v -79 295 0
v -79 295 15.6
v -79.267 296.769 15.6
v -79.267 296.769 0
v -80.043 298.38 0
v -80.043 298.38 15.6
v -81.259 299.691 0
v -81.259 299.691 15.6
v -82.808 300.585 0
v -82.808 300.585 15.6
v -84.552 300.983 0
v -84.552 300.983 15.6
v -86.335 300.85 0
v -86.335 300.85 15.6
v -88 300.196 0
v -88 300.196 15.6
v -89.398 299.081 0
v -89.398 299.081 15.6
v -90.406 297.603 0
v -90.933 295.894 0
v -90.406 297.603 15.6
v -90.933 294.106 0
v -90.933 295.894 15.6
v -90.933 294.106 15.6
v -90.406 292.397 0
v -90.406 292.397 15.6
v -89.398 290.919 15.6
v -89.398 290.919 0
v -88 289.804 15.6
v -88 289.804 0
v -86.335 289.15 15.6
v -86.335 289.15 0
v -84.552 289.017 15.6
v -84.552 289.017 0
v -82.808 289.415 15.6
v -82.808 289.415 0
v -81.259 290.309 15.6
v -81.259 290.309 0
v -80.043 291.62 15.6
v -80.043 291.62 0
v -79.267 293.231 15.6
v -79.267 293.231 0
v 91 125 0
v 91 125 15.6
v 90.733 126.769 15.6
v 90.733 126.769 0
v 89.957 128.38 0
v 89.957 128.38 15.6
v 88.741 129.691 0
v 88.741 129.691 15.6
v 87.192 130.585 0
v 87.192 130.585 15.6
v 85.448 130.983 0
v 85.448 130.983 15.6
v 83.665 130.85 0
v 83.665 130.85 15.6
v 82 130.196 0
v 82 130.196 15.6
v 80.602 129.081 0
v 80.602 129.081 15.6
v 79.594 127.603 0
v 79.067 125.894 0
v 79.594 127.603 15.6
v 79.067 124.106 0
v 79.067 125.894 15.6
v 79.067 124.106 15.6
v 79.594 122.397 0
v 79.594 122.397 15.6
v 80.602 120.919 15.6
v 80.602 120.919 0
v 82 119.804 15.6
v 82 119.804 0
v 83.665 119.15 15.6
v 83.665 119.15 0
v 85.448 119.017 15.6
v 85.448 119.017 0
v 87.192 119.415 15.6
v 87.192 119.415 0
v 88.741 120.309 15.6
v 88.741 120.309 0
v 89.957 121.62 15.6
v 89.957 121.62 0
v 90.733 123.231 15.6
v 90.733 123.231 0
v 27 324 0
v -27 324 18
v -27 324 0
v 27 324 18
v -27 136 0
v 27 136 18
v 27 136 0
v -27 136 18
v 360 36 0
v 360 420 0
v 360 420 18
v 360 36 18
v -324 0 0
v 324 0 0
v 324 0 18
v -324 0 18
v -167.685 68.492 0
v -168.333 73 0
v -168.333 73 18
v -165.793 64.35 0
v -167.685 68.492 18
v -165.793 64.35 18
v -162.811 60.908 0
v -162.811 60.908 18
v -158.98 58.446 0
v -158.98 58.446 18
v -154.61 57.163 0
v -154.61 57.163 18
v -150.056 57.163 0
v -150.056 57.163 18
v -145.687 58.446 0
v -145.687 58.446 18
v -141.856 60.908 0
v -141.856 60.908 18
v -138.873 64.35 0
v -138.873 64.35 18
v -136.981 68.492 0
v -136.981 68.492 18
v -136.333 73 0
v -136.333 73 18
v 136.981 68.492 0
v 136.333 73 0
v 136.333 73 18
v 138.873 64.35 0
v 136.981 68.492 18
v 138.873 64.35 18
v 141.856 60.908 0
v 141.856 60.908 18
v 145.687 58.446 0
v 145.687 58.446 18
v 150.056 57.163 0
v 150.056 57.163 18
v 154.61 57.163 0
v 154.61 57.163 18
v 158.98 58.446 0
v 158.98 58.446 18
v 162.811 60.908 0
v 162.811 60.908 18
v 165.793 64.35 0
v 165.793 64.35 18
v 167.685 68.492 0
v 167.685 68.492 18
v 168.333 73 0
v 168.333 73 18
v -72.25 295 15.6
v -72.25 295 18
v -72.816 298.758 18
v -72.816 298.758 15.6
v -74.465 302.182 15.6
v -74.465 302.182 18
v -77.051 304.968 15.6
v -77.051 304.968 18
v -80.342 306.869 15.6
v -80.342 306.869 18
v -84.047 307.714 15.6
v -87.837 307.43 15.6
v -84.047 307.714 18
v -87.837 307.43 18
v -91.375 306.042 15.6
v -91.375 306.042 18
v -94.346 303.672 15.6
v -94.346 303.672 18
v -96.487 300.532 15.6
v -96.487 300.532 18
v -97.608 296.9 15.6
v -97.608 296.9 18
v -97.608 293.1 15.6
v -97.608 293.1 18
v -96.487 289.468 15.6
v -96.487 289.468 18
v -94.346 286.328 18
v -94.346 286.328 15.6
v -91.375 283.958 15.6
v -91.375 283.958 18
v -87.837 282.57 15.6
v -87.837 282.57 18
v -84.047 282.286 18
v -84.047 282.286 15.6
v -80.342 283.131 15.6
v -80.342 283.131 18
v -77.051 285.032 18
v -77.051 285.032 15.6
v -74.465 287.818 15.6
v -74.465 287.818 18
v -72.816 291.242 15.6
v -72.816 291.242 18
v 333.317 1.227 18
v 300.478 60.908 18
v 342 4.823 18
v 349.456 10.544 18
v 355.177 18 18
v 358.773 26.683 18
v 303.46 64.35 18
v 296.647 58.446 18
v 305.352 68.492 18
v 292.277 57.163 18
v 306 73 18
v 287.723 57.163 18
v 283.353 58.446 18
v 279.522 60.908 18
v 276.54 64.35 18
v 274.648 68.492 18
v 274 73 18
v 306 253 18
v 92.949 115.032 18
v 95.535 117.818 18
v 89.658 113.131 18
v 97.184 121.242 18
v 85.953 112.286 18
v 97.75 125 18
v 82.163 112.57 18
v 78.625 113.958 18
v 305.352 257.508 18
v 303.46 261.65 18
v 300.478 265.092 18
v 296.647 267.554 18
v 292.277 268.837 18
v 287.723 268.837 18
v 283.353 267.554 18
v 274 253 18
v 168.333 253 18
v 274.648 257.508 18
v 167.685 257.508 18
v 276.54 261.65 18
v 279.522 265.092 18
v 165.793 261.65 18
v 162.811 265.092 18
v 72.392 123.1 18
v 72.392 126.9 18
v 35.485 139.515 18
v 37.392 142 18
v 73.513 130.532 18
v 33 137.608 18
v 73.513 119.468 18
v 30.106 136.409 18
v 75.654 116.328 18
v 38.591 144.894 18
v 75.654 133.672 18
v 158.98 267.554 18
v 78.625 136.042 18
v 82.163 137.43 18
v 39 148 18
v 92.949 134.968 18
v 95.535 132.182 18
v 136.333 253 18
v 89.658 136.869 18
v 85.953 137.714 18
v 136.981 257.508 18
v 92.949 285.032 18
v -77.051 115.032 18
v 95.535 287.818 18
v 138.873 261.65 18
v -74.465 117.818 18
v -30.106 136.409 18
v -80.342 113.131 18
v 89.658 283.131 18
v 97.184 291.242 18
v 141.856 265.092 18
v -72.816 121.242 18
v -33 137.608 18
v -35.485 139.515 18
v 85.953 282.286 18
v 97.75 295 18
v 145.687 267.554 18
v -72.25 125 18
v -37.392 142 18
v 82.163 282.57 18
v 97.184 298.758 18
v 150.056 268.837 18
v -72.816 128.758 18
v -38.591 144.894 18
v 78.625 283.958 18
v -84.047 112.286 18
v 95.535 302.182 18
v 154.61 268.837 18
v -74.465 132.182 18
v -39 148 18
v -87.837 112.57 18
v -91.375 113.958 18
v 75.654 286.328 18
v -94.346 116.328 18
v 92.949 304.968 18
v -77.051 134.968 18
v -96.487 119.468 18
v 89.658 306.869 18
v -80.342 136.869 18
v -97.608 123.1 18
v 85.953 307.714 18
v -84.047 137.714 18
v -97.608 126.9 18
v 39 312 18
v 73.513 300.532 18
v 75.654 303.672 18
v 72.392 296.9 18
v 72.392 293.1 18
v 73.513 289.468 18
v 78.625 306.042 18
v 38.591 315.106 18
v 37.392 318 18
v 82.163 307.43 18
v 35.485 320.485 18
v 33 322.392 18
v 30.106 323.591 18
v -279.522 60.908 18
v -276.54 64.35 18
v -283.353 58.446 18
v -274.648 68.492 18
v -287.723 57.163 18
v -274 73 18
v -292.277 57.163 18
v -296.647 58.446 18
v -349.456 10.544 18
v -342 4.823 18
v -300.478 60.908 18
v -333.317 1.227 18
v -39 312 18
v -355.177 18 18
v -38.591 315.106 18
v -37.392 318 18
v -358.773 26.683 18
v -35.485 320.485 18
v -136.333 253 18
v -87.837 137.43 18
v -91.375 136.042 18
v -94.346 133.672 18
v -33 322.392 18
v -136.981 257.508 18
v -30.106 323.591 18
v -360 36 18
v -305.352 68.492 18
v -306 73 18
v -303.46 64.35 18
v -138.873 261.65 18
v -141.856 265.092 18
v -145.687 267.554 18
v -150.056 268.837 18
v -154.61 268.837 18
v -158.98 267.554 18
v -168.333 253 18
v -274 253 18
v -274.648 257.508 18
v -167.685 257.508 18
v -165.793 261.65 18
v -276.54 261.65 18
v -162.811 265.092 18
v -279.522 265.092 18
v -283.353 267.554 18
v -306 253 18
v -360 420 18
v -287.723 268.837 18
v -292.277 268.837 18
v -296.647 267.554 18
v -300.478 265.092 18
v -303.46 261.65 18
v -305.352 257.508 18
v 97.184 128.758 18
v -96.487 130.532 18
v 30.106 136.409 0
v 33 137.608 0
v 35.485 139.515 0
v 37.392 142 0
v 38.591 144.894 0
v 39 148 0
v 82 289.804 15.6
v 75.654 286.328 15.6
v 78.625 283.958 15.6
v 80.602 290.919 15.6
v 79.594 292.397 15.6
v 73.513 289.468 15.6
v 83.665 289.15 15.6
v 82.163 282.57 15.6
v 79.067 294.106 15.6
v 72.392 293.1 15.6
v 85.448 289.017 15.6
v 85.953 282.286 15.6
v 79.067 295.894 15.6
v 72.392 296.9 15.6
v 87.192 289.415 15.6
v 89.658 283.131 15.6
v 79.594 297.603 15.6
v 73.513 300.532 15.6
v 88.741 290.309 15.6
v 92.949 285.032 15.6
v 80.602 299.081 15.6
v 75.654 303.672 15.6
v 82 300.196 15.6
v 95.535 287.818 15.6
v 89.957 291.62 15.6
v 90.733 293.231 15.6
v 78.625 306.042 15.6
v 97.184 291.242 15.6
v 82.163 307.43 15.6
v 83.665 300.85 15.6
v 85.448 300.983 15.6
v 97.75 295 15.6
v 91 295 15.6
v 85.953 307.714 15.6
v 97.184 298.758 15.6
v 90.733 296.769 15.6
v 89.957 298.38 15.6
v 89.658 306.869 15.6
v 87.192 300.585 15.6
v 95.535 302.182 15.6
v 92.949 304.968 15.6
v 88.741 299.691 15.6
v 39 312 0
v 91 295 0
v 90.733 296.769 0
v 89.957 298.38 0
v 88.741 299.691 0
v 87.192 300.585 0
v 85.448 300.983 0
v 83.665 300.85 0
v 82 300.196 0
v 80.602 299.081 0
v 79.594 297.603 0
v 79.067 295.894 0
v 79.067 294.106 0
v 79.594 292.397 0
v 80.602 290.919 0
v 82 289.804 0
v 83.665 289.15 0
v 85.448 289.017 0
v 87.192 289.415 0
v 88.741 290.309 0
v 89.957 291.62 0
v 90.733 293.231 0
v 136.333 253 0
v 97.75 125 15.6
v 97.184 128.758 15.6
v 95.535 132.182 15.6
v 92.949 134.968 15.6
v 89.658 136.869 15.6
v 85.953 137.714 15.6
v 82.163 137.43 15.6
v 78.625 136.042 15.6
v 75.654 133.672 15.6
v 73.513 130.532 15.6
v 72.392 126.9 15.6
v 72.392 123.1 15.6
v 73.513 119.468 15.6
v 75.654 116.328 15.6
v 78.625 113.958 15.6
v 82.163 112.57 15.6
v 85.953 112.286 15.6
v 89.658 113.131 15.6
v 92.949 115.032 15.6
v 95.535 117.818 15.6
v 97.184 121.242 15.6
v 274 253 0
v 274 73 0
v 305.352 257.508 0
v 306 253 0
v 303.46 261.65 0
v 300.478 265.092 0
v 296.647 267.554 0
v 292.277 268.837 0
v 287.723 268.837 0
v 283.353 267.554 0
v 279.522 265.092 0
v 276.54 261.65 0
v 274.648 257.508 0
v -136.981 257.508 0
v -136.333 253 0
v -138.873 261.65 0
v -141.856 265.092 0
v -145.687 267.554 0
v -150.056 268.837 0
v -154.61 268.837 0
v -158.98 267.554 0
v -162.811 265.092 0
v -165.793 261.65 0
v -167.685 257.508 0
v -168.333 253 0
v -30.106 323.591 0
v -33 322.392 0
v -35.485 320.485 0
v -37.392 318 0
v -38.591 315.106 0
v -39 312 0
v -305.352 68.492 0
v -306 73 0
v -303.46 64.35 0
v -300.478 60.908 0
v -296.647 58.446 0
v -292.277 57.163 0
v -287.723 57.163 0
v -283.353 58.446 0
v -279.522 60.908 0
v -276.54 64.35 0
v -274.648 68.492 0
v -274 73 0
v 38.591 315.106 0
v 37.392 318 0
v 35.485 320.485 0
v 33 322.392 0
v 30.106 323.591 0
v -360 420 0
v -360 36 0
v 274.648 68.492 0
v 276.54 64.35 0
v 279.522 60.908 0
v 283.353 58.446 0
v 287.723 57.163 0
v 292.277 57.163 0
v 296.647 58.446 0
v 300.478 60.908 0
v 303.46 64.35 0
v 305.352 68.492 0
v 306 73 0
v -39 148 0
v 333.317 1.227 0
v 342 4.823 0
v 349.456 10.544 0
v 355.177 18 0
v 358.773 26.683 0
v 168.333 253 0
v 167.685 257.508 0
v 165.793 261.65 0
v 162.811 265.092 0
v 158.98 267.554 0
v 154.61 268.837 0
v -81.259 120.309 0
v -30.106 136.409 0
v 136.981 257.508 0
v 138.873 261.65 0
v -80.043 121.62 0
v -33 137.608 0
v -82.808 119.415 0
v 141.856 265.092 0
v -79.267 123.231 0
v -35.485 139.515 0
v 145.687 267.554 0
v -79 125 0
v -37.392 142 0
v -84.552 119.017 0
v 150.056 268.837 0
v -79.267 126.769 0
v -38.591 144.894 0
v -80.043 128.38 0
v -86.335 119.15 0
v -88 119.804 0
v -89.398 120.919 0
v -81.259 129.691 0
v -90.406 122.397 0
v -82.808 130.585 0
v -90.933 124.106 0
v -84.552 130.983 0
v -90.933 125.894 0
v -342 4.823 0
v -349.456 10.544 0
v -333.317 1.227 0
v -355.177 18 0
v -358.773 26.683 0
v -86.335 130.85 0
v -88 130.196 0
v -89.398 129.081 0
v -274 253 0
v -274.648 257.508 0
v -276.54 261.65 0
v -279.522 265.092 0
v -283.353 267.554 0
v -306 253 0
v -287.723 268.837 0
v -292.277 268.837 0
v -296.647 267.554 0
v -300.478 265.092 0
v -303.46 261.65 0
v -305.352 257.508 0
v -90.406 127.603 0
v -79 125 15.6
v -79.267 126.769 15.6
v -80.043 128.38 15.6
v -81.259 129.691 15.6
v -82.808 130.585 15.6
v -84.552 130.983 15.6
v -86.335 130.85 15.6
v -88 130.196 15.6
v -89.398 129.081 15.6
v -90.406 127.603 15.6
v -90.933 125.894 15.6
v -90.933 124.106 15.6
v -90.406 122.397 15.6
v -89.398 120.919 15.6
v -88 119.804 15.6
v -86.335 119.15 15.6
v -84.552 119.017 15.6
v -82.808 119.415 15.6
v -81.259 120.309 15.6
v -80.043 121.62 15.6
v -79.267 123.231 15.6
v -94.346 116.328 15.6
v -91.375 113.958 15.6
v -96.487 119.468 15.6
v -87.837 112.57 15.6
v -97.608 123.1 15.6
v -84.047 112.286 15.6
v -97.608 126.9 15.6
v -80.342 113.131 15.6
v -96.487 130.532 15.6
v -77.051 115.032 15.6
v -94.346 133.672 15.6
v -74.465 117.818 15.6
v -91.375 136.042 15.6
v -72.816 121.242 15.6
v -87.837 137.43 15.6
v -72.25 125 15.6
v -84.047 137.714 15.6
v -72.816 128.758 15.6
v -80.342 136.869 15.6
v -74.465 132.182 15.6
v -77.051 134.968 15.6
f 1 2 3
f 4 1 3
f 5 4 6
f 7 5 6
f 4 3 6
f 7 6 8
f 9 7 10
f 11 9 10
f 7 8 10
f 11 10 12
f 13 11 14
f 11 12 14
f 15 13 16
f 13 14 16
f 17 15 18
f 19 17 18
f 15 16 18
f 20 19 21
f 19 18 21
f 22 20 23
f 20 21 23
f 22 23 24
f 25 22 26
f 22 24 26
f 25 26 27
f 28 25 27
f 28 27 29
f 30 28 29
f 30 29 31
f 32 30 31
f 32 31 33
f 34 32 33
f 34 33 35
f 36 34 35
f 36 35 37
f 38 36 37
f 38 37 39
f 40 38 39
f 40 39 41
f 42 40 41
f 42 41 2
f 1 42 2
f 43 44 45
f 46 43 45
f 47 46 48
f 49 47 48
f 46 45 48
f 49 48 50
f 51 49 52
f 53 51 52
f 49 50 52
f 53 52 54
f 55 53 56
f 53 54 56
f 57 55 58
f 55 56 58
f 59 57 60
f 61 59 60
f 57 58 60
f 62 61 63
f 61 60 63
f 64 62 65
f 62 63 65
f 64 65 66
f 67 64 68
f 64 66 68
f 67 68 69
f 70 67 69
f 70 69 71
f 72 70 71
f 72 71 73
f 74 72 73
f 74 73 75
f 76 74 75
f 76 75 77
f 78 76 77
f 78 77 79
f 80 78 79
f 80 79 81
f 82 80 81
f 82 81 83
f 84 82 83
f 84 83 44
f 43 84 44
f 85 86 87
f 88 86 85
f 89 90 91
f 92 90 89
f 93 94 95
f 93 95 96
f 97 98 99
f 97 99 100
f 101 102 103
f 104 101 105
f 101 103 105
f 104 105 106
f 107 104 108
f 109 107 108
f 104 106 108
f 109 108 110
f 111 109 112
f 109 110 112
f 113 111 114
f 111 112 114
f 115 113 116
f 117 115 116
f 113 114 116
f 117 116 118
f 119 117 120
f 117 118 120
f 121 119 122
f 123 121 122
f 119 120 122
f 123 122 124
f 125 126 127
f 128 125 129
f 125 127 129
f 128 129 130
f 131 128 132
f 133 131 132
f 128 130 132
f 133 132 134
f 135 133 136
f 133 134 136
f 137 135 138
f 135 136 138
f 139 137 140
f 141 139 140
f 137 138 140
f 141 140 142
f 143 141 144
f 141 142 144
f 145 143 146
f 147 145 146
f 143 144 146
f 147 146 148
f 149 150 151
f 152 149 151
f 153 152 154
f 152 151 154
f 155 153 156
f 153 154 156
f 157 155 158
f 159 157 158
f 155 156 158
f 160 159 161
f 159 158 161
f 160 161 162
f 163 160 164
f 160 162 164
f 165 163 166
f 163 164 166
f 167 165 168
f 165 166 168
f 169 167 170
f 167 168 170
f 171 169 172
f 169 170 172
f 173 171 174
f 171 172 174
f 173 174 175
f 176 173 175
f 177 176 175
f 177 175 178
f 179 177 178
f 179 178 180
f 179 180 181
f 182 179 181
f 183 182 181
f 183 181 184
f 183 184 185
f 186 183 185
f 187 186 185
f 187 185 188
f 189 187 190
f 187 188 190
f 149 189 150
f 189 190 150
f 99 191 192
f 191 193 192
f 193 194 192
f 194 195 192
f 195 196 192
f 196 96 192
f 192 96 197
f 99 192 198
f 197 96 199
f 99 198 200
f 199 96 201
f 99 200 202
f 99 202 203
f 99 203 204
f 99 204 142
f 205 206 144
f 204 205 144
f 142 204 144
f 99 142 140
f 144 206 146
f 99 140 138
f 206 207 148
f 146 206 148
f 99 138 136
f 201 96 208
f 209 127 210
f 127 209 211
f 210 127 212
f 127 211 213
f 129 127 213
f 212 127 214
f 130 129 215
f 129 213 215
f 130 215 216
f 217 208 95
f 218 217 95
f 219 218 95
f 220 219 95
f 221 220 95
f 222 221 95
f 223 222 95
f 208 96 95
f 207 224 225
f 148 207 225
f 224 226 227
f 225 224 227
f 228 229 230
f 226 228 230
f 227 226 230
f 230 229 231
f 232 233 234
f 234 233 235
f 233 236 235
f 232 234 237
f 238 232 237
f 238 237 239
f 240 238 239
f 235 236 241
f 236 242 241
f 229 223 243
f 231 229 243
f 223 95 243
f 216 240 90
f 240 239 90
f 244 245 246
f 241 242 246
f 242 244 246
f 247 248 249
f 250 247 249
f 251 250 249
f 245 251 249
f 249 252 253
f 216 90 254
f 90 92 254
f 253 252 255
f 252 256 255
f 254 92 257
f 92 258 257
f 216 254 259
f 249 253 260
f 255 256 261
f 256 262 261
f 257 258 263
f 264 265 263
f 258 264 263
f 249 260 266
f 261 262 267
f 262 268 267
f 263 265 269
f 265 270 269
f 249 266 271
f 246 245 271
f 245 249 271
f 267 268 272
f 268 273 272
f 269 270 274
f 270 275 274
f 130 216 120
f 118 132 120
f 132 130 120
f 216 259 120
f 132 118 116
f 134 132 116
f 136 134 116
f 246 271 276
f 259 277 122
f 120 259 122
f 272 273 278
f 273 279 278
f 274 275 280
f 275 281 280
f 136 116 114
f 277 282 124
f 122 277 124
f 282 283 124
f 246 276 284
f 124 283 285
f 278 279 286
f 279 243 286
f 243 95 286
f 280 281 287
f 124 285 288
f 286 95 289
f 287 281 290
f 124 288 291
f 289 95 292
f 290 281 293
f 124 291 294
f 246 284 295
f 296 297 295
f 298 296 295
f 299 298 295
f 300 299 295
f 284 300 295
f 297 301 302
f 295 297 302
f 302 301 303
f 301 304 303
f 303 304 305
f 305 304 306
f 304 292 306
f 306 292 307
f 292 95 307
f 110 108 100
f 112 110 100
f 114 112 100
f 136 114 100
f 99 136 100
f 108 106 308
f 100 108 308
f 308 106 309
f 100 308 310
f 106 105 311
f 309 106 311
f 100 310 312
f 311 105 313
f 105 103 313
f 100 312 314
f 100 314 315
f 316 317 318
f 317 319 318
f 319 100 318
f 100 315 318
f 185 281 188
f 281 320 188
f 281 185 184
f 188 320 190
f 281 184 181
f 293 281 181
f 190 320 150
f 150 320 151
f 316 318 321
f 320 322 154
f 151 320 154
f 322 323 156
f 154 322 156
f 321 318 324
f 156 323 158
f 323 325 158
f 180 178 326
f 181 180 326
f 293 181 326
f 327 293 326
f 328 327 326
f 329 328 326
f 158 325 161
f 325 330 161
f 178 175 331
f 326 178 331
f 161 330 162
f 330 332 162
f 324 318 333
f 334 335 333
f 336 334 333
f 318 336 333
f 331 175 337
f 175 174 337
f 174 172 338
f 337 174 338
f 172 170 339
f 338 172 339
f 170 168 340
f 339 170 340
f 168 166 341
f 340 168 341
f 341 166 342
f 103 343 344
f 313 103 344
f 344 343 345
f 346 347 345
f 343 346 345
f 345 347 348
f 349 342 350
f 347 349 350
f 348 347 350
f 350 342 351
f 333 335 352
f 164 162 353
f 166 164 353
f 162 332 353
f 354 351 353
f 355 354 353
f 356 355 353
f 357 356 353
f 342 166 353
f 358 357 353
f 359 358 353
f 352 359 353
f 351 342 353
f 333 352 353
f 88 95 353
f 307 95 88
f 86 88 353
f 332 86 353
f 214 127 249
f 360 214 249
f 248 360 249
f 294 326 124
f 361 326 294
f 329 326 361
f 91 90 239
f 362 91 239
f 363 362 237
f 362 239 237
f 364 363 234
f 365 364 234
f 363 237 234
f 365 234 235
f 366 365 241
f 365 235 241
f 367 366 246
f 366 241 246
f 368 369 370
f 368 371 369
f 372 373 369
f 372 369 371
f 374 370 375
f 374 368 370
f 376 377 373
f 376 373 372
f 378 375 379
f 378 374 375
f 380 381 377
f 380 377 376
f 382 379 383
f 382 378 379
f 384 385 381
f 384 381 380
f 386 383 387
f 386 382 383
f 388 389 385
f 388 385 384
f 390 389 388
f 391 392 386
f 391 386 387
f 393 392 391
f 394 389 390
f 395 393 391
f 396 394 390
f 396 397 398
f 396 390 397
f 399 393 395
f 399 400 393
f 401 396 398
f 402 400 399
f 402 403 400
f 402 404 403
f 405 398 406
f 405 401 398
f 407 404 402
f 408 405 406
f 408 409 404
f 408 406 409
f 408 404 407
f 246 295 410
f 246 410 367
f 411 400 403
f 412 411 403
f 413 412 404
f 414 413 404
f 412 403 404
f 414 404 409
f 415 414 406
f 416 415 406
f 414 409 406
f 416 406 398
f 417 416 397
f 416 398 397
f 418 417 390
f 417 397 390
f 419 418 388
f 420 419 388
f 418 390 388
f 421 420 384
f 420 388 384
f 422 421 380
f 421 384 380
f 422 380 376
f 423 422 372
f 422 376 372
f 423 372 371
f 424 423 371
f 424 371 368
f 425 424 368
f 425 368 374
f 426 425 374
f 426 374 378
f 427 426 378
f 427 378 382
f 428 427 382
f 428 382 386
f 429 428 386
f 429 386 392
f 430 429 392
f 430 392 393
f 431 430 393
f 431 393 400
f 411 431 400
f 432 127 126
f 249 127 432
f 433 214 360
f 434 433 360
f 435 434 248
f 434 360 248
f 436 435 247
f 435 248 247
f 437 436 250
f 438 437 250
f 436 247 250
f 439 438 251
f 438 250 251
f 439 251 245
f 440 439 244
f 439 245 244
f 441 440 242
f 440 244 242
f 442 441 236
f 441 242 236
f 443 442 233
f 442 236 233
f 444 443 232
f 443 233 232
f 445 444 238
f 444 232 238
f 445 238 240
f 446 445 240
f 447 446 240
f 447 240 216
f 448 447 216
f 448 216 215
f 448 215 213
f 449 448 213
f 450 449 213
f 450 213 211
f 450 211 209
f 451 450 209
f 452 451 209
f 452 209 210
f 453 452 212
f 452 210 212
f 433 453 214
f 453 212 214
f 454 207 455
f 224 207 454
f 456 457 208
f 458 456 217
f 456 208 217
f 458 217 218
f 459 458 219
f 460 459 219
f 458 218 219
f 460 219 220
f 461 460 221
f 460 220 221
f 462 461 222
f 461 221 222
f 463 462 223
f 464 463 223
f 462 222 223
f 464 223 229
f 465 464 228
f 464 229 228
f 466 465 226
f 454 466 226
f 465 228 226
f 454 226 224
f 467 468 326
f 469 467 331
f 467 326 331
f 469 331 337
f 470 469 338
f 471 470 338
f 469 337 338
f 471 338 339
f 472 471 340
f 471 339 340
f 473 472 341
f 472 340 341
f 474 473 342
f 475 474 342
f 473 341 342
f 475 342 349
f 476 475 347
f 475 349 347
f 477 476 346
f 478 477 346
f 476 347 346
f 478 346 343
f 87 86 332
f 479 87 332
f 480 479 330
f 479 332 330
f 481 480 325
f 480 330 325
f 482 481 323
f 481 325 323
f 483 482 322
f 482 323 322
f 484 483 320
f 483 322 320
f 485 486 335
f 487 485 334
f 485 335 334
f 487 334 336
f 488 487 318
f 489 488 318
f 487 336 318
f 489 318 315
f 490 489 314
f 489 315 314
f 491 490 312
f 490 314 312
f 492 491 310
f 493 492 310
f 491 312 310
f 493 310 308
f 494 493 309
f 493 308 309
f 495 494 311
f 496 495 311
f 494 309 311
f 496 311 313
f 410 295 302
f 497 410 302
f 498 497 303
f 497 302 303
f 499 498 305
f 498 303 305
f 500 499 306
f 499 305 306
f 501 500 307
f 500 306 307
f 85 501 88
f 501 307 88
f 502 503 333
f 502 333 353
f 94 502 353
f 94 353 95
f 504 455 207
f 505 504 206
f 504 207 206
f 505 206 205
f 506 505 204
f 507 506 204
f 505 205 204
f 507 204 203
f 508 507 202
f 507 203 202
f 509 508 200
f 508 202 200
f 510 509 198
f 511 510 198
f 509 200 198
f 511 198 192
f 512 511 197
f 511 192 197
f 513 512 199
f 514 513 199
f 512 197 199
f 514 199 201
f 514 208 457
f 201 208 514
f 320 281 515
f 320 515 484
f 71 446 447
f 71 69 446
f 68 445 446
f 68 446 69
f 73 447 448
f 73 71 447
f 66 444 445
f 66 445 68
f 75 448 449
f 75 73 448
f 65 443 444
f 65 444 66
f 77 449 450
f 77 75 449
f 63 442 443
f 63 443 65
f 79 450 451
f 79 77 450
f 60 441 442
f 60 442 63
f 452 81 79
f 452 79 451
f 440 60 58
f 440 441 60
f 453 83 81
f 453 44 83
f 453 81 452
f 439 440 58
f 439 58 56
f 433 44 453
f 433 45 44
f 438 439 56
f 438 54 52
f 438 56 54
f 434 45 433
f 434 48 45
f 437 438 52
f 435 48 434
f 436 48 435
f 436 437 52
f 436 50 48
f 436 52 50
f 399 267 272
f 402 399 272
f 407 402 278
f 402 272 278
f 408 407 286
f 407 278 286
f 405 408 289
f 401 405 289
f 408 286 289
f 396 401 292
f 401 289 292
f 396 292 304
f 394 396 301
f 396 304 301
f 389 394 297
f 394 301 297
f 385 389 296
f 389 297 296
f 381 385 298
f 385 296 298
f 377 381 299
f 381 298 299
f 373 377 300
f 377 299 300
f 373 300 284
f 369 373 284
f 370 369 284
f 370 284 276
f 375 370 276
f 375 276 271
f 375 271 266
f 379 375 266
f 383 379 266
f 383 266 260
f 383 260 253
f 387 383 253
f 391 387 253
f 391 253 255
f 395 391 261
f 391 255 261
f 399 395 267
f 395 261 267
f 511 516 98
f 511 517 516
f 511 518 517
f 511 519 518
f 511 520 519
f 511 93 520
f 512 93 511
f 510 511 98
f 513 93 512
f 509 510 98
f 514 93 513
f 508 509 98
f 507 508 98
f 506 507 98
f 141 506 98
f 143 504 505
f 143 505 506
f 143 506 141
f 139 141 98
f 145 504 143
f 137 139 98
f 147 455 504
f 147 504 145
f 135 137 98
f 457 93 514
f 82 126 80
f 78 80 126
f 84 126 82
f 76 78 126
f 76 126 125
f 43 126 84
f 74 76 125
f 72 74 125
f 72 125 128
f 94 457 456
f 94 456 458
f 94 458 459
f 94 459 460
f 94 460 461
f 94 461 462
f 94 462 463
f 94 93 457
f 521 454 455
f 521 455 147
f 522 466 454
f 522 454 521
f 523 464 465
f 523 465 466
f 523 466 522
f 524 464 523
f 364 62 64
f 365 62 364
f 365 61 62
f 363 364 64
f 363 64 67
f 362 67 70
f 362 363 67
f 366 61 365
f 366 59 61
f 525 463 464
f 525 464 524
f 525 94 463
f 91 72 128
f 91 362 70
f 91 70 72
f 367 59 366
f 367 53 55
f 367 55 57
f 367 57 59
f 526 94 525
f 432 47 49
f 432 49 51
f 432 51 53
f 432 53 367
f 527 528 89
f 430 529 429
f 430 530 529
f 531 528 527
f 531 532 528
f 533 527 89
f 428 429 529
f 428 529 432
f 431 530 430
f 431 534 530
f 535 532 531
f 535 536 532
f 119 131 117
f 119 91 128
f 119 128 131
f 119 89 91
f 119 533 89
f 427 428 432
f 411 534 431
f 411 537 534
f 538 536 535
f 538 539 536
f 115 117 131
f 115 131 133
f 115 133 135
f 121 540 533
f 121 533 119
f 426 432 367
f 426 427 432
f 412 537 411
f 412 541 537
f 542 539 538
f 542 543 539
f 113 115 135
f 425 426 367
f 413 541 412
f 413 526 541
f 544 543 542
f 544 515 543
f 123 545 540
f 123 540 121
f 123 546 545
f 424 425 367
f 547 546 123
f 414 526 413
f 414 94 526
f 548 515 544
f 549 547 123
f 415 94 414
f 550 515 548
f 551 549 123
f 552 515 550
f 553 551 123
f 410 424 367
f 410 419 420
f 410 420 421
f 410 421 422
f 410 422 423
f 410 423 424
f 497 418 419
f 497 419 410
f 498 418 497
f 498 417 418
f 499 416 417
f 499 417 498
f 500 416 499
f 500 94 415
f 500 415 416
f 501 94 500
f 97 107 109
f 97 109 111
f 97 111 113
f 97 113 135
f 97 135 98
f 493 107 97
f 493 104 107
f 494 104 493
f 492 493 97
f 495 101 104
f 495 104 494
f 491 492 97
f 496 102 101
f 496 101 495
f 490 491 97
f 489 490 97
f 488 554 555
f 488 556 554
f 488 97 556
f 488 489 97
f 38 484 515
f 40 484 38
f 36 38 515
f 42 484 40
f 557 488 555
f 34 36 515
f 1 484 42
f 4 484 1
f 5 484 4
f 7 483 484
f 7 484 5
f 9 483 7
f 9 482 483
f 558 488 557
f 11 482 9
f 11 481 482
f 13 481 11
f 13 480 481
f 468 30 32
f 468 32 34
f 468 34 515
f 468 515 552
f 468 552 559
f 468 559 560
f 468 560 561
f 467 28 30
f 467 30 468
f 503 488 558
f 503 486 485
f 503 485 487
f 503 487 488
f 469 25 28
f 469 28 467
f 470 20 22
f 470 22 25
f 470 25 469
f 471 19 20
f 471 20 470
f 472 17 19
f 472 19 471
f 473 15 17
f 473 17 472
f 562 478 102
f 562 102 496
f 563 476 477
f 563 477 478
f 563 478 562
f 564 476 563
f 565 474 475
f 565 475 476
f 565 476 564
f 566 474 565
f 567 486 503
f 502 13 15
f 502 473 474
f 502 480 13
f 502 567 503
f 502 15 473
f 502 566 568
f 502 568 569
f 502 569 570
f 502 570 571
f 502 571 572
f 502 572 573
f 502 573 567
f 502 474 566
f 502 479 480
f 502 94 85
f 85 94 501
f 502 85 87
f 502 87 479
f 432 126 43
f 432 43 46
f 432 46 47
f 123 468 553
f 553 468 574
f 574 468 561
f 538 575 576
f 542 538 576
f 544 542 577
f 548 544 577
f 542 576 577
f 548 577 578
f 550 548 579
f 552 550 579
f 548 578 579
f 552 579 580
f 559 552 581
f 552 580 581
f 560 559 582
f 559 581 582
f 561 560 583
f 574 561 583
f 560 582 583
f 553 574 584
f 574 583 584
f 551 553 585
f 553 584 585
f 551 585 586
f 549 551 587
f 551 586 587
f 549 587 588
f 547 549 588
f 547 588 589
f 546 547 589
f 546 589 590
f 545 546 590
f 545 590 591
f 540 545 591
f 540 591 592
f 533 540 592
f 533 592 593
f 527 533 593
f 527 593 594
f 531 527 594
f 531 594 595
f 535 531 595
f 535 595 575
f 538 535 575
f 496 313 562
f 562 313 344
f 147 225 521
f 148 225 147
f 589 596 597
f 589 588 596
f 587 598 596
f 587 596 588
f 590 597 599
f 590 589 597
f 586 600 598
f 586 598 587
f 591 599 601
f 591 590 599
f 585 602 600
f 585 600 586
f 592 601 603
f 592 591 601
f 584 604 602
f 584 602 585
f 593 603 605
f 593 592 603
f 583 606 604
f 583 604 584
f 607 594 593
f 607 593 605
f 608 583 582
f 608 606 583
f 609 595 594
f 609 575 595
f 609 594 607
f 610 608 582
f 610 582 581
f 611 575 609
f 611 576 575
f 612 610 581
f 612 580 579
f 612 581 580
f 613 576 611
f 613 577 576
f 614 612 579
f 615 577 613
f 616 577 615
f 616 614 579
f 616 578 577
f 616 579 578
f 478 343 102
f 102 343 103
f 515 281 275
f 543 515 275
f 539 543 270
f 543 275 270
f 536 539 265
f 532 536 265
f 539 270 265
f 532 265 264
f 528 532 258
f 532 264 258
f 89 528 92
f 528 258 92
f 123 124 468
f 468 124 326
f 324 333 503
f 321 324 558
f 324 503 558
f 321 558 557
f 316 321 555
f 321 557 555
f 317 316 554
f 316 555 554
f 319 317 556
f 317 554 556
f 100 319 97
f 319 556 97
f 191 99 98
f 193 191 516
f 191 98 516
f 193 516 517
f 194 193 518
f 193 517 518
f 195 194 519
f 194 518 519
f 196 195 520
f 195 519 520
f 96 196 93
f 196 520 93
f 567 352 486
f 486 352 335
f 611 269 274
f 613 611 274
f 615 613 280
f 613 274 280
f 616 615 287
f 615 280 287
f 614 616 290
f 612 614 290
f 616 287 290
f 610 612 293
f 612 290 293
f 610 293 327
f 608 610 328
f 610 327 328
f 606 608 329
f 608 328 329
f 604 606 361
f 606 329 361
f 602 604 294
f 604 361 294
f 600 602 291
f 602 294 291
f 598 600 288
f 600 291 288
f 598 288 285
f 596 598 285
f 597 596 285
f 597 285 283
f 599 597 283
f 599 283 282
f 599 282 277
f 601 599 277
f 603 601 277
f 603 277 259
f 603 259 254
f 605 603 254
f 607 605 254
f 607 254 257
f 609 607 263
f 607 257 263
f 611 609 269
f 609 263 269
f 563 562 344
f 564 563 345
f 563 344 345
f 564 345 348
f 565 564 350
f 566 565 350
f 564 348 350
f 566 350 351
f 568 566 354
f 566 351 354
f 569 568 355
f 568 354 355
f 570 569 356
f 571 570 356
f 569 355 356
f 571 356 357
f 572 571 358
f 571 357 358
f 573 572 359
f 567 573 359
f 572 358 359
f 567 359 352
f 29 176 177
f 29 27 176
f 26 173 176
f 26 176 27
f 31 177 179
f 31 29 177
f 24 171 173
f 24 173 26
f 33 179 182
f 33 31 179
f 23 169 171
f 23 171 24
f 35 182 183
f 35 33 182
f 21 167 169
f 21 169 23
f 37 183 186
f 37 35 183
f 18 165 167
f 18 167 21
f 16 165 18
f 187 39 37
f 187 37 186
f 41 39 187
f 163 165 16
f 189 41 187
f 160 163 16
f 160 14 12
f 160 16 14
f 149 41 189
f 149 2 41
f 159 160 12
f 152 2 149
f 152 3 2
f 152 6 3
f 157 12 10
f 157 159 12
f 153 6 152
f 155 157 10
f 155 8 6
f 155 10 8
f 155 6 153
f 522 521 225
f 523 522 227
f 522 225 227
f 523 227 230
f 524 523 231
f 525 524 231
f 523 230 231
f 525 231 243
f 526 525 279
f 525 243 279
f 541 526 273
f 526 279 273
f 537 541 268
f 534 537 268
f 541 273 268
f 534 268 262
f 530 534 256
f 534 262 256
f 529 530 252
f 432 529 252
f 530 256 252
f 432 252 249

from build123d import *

# Parameters (mm, degrees)
PAD_DEPTH       = 18
SKETCH001_R     = 6
POCKET_DEPTH    = 18
SKETCH006_R     = 12.75
POCKET003_DEPTH = 2.4


with BuildPart() as part:
    # Sketch → Pad (new body)
    with BuildSketch(Plane.XY):
        with BuildLine():
            Line((-360, 420), (360, 420))
            Line((360, 420), (360, 36))
            ThreePointArc((324, 0), (349.455844, 10.544156), (360, 36))
            Line((324, 0), (-324, 0))
            ThreePointArc((-360, 36), (-349.455844, 10.544156), (-324, 0))
            Line((-360, 36), (-360, 420))
        make_face()
    extrude(amount=PAD_DEPTH)

    # Sketch001 → Pocket (cut)
    with BuildSketch(Plane.XY.offset(18)):
        with Locations((-85, 125)):
            Circle(SKETCH001_R)
        with Locations((-85, 295)):
            Circle(SKETCH001_R)
        with Locations((85, 295)):
            Circle(SKETCH001_R)
        with Locations((85, 125)):
            Circle(SKETCH001_R)
        with BuildLine():
            ThreePointArc((-274, 253), (-290, 269), (-306, 253))
            Line((-306, 253), (-306, 73))
            ThreePointArc((-306, 73), (-290, 57), (-274, 73))
            Line((-274, 73), (-274, 253))
        make_face()
        with BuildLine():
            ThreePointArc((-136.333333, 253), (-152.333333, 269), (-168.333333, 253))
            Line((-168.333333, 253), (-168.333333, 73))
            ThreePointArc((-168.333333, 73), (-152.333333, 57), (-136.333333, 73))
            Line((-136.333333, 73), (-136.333333, 253))
        make_face()
        with BuildLine():
            ThreePointArc((306, 253), (290, 269), (274, 253))
            Line((274, 73), (274, 253))
            ThreePointArc((274, 73), (290, 57), (306, 73))
            Line((306, 253), (306, 73))
        make_face()
        with BuildLine():
            ThreePointArc((168.333333, 253), (152.333333, 269), (136.333333, 253))
            Line((136.333333, 73), (136.333333, 253))
            ThreePointArc((136.333333, 73), (152.333333, 57), (168.333333, 73))
            Line((168.333333, 253), (168.333333, 73))
        make_face()
        with BuildLine():
            Line((-27, 324), (27, 324))
            ThreePointArc((39, 312), (35.485281, 320.485281), (27, 324))
            Line((39, 312), (39, 148))
            ThreePointArc((27, 136), (35.485281, 139.514719), (39, 148))
            Line((27, 136), (-27, 136))
            ThreePointArc((-39, 148), (-35.485281, 139.514719), (-27, 136))
            Line((-39, 148), (-39, 312))
            ThreePointArc((-27, 324), (-35.485281, 320.485281), (-39, 312))
        make_face()
    extrude(amount=-POCKET_DEPTH, mode=Mode.SUBTRACT)

    # Sketch006 → Pocket003 (cut)
    with BuildSketch(Plane.XY.offset(18)):
        with Locations((-85, 295)):
            Circle(SKETCH006_R)
        with Locations((85, 295)):
            Circle(SKETCH006_R)
        with Locations((-85, 125)):
            Circle(SKETCH006_R)
        with Locations((85, 125)):
            Circle(SKETCH006_R)
    extrude(amount=-POCKET003_DEPTH, mode=Mode.SUBTRACT)


solid = part.part
